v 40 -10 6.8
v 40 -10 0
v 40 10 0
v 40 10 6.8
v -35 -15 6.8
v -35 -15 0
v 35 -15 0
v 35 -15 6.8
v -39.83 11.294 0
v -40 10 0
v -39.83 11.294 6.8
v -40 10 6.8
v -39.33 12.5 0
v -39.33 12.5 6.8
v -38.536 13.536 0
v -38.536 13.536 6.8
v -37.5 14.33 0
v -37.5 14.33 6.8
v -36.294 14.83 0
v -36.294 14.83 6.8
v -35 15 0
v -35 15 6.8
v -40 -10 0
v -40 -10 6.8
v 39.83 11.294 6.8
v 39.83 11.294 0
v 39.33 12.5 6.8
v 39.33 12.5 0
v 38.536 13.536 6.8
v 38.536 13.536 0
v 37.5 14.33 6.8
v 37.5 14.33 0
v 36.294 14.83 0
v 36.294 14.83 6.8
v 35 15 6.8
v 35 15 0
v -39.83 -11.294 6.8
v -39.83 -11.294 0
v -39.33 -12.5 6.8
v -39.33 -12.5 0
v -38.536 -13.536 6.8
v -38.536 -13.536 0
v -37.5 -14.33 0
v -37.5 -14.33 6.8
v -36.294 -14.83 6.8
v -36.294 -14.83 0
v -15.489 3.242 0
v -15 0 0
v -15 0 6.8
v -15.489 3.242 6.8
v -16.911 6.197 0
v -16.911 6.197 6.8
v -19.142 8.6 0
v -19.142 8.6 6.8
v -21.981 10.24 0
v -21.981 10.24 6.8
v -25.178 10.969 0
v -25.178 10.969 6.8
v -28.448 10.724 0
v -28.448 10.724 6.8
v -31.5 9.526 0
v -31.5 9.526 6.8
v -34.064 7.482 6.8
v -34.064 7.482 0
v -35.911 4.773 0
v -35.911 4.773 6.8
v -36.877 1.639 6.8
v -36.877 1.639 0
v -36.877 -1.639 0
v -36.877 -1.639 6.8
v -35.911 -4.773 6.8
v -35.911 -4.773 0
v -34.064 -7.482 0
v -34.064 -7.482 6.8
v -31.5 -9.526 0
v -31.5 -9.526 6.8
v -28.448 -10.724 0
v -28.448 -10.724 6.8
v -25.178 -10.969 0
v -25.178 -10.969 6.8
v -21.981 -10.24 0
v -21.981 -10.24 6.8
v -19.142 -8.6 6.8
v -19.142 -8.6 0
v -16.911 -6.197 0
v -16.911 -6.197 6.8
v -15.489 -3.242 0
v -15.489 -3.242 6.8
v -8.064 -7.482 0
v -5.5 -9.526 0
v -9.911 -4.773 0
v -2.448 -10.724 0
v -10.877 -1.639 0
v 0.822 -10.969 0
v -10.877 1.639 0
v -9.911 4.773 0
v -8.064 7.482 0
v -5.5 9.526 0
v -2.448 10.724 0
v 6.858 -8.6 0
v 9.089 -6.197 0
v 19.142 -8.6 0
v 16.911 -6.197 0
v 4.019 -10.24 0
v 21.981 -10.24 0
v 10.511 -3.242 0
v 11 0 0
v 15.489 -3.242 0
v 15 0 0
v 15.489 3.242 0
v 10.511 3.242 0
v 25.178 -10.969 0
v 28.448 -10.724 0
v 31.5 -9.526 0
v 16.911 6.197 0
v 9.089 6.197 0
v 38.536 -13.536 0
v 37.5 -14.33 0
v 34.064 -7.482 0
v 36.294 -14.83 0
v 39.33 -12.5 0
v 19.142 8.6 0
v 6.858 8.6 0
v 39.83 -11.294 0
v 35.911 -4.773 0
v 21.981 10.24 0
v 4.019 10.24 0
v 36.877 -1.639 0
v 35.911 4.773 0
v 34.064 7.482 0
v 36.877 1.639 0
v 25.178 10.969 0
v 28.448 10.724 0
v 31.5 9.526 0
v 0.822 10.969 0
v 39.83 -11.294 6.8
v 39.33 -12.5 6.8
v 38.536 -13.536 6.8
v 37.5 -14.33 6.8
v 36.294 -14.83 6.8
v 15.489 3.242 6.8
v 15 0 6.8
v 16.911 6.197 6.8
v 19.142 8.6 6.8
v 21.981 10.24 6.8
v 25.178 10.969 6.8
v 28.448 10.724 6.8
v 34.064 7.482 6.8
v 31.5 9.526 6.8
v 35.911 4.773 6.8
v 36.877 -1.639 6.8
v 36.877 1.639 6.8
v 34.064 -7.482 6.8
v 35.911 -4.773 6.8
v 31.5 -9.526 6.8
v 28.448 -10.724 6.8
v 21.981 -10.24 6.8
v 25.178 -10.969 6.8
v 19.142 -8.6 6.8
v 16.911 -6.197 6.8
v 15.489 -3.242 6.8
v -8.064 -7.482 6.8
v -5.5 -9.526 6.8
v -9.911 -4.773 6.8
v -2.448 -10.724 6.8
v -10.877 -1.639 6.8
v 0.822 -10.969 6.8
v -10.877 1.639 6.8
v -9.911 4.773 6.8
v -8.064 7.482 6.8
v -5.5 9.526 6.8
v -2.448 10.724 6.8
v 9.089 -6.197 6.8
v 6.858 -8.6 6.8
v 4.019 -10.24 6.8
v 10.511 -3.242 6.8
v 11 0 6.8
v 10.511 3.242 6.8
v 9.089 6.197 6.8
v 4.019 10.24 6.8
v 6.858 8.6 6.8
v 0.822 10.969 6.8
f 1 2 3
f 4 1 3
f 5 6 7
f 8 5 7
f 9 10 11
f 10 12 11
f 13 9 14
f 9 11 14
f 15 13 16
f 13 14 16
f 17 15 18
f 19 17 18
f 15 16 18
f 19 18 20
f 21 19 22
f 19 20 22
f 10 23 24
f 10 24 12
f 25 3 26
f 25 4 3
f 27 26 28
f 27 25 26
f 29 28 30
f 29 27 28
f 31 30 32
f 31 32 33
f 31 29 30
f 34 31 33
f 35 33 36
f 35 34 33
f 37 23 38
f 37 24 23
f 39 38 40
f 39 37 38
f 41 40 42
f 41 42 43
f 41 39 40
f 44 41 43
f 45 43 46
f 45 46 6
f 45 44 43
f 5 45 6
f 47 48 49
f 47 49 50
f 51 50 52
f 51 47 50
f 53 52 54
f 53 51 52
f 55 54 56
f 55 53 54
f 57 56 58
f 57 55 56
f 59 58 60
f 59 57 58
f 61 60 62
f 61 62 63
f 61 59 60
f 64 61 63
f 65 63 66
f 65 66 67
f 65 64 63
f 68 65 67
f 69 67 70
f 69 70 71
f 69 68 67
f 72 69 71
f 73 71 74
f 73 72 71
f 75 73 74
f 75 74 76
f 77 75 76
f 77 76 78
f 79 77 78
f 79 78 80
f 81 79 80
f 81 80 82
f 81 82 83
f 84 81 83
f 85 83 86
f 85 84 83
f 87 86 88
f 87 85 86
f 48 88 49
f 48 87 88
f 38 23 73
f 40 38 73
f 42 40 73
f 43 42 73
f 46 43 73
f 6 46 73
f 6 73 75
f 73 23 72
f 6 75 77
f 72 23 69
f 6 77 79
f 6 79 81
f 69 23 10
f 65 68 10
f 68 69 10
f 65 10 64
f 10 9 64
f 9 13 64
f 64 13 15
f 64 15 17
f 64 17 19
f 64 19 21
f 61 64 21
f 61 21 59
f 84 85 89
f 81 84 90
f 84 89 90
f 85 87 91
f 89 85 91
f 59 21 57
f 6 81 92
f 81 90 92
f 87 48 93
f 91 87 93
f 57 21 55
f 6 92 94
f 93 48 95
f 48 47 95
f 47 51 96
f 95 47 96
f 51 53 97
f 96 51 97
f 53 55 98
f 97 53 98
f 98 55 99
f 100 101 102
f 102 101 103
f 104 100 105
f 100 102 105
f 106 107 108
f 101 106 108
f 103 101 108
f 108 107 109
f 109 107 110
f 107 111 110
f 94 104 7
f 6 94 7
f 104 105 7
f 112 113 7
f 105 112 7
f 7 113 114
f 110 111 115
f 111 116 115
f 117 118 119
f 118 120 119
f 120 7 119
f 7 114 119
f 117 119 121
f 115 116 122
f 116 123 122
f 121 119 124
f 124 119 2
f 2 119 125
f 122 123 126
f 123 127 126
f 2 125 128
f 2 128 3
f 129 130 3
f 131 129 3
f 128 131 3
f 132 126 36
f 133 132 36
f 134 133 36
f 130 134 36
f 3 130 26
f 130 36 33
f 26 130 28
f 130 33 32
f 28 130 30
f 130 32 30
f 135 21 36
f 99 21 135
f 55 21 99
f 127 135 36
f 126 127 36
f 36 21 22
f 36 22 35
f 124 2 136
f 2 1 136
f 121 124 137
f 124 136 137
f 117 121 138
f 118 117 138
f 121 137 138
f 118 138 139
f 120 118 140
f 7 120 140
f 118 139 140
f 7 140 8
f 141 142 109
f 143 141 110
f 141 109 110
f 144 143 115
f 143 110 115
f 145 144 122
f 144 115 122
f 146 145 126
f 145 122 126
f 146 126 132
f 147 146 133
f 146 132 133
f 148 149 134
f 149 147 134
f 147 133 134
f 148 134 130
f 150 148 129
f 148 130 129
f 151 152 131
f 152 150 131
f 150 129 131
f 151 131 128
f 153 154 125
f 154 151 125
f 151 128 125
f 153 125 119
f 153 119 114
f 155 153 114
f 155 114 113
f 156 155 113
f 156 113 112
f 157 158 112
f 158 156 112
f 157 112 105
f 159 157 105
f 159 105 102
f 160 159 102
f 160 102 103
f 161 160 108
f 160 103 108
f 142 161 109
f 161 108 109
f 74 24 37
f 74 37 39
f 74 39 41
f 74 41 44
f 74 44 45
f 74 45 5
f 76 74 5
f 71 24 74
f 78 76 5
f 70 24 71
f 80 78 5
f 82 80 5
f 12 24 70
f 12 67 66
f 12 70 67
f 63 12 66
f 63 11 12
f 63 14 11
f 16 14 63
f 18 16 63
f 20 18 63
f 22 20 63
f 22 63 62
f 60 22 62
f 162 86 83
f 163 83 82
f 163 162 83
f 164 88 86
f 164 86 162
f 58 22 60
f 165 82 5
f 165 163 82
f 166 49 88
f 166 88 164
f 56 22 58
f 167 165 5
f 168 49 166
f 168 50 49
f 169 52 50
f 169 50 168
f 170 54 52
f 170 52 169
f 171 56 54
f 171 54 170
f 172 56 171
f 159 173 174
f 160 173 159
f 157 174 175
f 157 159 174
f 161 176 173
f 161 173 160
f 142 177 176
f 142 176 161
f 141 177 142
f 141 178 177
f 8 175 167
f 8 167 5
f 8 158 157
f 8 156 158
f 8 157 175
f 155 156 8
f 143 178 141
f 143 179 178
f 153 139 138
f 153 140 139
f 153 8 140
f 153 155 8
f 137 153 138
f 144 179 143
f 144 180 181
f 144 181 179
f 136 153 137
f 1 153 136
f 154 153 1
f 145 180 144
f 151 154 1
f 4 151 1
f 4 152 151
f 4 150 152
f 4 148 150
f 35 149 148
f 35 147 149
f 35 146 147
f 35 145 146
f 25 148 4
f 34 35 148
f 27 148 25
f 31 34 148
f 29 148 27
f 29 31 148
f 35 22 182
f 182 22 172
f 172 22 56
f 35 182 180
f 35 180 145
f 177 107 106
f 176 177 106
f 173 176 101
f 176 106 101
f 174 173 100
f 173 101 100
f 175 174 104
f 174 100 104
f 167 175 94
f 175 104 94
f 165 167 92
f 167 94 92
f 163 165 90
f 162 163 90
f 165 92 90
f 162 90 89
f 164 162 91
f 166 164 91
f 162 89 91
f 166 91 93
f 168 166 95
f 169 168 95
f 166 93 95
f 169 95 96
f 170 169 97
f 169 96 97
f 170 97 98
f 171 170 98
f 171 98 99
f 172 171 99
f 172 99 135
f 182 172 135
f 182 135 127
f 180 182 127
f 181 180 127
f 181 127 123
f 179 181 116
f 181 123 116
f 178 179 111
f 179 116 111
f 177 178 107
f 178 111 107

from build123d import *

# Parameters (mm, degrees)
F0_R     = 11
F0_W     = 80
F0_H     = 30
F1_DEPTH = 6.8
F2_R     = 11
F3_DEPTH = 25
F4_R     = 5


with BuildPart() as f1:
    # F0 (on Top) → F1 (new body)
    with BuildSketch(Plane.XY):
        with Locations((-26, 0)):
            Circle(F0_R)
        with BuildLine():
            ThreePointArc((37, 0), (26, 11), (15, 0))
            ThreePointArc((15, 0), (26, -11), (37, 0))
        make_face()
        with BuildLine():
            ThreePointArc((-11, 0), (0, -11), (11, 0))
            Line((11, 0), (0, 0))
            Line((0, 0), (-11, 0))
        make_face()
        with BuildLine():
            Line((0, 0), (11, 0))
            ThreePointArc((11, 0), (0, 11), (-11, 0))
            Line((-11, 0), (0, 0))
        make_face()
        Rectangle(F0_W, F0_H)
        with Locations((-26, 0)):
            Circle(F0_R, mode=Mode.SUBTRACT)
        with BuildLine():
            ThreePointArc((-11, 0), (0, 11), (11, 0))
            ThreePointArc((11, 0), (0, -11), (-11, 0))
        make_face(mode=Mode.SUBTRACT)
        with BuildLine():
            ThreePointArc((37, 0), (26, -11), (15, 0))
            ThreePointArc((15, 0), (26, 11), (37, 0))
        make_face(mode=Mode.SUBTRACT)
    extrude(amount=F1_DEPTH)

    # F2 (on face) → F3 (cut)
    with BuildSketch(Plane(origin=(0, 0, 0), x_dir=(1, 0, 0), z_dir=(0, 0, -1))):
        with Locations((26, 0)):
            Circle(F2_R)
        Circle(F2_R)
        with Locations((-26, 0)):
            Circle(F2_R)
    extrude(amount=-F3_DEPTH, mode=Mode.SUBTRACT)

    # F4
    f4_edges = [f1.edges().sort_by_distance(p)[0] for p in [
        (-40, -15, 3.4),
        (-40, 15, 3.4),
        (40, 15, 3.4),
        (40, -15, 3.4),
    ]]
    fillet(f4_edges, radius=F4_R)


solid = f1.part
